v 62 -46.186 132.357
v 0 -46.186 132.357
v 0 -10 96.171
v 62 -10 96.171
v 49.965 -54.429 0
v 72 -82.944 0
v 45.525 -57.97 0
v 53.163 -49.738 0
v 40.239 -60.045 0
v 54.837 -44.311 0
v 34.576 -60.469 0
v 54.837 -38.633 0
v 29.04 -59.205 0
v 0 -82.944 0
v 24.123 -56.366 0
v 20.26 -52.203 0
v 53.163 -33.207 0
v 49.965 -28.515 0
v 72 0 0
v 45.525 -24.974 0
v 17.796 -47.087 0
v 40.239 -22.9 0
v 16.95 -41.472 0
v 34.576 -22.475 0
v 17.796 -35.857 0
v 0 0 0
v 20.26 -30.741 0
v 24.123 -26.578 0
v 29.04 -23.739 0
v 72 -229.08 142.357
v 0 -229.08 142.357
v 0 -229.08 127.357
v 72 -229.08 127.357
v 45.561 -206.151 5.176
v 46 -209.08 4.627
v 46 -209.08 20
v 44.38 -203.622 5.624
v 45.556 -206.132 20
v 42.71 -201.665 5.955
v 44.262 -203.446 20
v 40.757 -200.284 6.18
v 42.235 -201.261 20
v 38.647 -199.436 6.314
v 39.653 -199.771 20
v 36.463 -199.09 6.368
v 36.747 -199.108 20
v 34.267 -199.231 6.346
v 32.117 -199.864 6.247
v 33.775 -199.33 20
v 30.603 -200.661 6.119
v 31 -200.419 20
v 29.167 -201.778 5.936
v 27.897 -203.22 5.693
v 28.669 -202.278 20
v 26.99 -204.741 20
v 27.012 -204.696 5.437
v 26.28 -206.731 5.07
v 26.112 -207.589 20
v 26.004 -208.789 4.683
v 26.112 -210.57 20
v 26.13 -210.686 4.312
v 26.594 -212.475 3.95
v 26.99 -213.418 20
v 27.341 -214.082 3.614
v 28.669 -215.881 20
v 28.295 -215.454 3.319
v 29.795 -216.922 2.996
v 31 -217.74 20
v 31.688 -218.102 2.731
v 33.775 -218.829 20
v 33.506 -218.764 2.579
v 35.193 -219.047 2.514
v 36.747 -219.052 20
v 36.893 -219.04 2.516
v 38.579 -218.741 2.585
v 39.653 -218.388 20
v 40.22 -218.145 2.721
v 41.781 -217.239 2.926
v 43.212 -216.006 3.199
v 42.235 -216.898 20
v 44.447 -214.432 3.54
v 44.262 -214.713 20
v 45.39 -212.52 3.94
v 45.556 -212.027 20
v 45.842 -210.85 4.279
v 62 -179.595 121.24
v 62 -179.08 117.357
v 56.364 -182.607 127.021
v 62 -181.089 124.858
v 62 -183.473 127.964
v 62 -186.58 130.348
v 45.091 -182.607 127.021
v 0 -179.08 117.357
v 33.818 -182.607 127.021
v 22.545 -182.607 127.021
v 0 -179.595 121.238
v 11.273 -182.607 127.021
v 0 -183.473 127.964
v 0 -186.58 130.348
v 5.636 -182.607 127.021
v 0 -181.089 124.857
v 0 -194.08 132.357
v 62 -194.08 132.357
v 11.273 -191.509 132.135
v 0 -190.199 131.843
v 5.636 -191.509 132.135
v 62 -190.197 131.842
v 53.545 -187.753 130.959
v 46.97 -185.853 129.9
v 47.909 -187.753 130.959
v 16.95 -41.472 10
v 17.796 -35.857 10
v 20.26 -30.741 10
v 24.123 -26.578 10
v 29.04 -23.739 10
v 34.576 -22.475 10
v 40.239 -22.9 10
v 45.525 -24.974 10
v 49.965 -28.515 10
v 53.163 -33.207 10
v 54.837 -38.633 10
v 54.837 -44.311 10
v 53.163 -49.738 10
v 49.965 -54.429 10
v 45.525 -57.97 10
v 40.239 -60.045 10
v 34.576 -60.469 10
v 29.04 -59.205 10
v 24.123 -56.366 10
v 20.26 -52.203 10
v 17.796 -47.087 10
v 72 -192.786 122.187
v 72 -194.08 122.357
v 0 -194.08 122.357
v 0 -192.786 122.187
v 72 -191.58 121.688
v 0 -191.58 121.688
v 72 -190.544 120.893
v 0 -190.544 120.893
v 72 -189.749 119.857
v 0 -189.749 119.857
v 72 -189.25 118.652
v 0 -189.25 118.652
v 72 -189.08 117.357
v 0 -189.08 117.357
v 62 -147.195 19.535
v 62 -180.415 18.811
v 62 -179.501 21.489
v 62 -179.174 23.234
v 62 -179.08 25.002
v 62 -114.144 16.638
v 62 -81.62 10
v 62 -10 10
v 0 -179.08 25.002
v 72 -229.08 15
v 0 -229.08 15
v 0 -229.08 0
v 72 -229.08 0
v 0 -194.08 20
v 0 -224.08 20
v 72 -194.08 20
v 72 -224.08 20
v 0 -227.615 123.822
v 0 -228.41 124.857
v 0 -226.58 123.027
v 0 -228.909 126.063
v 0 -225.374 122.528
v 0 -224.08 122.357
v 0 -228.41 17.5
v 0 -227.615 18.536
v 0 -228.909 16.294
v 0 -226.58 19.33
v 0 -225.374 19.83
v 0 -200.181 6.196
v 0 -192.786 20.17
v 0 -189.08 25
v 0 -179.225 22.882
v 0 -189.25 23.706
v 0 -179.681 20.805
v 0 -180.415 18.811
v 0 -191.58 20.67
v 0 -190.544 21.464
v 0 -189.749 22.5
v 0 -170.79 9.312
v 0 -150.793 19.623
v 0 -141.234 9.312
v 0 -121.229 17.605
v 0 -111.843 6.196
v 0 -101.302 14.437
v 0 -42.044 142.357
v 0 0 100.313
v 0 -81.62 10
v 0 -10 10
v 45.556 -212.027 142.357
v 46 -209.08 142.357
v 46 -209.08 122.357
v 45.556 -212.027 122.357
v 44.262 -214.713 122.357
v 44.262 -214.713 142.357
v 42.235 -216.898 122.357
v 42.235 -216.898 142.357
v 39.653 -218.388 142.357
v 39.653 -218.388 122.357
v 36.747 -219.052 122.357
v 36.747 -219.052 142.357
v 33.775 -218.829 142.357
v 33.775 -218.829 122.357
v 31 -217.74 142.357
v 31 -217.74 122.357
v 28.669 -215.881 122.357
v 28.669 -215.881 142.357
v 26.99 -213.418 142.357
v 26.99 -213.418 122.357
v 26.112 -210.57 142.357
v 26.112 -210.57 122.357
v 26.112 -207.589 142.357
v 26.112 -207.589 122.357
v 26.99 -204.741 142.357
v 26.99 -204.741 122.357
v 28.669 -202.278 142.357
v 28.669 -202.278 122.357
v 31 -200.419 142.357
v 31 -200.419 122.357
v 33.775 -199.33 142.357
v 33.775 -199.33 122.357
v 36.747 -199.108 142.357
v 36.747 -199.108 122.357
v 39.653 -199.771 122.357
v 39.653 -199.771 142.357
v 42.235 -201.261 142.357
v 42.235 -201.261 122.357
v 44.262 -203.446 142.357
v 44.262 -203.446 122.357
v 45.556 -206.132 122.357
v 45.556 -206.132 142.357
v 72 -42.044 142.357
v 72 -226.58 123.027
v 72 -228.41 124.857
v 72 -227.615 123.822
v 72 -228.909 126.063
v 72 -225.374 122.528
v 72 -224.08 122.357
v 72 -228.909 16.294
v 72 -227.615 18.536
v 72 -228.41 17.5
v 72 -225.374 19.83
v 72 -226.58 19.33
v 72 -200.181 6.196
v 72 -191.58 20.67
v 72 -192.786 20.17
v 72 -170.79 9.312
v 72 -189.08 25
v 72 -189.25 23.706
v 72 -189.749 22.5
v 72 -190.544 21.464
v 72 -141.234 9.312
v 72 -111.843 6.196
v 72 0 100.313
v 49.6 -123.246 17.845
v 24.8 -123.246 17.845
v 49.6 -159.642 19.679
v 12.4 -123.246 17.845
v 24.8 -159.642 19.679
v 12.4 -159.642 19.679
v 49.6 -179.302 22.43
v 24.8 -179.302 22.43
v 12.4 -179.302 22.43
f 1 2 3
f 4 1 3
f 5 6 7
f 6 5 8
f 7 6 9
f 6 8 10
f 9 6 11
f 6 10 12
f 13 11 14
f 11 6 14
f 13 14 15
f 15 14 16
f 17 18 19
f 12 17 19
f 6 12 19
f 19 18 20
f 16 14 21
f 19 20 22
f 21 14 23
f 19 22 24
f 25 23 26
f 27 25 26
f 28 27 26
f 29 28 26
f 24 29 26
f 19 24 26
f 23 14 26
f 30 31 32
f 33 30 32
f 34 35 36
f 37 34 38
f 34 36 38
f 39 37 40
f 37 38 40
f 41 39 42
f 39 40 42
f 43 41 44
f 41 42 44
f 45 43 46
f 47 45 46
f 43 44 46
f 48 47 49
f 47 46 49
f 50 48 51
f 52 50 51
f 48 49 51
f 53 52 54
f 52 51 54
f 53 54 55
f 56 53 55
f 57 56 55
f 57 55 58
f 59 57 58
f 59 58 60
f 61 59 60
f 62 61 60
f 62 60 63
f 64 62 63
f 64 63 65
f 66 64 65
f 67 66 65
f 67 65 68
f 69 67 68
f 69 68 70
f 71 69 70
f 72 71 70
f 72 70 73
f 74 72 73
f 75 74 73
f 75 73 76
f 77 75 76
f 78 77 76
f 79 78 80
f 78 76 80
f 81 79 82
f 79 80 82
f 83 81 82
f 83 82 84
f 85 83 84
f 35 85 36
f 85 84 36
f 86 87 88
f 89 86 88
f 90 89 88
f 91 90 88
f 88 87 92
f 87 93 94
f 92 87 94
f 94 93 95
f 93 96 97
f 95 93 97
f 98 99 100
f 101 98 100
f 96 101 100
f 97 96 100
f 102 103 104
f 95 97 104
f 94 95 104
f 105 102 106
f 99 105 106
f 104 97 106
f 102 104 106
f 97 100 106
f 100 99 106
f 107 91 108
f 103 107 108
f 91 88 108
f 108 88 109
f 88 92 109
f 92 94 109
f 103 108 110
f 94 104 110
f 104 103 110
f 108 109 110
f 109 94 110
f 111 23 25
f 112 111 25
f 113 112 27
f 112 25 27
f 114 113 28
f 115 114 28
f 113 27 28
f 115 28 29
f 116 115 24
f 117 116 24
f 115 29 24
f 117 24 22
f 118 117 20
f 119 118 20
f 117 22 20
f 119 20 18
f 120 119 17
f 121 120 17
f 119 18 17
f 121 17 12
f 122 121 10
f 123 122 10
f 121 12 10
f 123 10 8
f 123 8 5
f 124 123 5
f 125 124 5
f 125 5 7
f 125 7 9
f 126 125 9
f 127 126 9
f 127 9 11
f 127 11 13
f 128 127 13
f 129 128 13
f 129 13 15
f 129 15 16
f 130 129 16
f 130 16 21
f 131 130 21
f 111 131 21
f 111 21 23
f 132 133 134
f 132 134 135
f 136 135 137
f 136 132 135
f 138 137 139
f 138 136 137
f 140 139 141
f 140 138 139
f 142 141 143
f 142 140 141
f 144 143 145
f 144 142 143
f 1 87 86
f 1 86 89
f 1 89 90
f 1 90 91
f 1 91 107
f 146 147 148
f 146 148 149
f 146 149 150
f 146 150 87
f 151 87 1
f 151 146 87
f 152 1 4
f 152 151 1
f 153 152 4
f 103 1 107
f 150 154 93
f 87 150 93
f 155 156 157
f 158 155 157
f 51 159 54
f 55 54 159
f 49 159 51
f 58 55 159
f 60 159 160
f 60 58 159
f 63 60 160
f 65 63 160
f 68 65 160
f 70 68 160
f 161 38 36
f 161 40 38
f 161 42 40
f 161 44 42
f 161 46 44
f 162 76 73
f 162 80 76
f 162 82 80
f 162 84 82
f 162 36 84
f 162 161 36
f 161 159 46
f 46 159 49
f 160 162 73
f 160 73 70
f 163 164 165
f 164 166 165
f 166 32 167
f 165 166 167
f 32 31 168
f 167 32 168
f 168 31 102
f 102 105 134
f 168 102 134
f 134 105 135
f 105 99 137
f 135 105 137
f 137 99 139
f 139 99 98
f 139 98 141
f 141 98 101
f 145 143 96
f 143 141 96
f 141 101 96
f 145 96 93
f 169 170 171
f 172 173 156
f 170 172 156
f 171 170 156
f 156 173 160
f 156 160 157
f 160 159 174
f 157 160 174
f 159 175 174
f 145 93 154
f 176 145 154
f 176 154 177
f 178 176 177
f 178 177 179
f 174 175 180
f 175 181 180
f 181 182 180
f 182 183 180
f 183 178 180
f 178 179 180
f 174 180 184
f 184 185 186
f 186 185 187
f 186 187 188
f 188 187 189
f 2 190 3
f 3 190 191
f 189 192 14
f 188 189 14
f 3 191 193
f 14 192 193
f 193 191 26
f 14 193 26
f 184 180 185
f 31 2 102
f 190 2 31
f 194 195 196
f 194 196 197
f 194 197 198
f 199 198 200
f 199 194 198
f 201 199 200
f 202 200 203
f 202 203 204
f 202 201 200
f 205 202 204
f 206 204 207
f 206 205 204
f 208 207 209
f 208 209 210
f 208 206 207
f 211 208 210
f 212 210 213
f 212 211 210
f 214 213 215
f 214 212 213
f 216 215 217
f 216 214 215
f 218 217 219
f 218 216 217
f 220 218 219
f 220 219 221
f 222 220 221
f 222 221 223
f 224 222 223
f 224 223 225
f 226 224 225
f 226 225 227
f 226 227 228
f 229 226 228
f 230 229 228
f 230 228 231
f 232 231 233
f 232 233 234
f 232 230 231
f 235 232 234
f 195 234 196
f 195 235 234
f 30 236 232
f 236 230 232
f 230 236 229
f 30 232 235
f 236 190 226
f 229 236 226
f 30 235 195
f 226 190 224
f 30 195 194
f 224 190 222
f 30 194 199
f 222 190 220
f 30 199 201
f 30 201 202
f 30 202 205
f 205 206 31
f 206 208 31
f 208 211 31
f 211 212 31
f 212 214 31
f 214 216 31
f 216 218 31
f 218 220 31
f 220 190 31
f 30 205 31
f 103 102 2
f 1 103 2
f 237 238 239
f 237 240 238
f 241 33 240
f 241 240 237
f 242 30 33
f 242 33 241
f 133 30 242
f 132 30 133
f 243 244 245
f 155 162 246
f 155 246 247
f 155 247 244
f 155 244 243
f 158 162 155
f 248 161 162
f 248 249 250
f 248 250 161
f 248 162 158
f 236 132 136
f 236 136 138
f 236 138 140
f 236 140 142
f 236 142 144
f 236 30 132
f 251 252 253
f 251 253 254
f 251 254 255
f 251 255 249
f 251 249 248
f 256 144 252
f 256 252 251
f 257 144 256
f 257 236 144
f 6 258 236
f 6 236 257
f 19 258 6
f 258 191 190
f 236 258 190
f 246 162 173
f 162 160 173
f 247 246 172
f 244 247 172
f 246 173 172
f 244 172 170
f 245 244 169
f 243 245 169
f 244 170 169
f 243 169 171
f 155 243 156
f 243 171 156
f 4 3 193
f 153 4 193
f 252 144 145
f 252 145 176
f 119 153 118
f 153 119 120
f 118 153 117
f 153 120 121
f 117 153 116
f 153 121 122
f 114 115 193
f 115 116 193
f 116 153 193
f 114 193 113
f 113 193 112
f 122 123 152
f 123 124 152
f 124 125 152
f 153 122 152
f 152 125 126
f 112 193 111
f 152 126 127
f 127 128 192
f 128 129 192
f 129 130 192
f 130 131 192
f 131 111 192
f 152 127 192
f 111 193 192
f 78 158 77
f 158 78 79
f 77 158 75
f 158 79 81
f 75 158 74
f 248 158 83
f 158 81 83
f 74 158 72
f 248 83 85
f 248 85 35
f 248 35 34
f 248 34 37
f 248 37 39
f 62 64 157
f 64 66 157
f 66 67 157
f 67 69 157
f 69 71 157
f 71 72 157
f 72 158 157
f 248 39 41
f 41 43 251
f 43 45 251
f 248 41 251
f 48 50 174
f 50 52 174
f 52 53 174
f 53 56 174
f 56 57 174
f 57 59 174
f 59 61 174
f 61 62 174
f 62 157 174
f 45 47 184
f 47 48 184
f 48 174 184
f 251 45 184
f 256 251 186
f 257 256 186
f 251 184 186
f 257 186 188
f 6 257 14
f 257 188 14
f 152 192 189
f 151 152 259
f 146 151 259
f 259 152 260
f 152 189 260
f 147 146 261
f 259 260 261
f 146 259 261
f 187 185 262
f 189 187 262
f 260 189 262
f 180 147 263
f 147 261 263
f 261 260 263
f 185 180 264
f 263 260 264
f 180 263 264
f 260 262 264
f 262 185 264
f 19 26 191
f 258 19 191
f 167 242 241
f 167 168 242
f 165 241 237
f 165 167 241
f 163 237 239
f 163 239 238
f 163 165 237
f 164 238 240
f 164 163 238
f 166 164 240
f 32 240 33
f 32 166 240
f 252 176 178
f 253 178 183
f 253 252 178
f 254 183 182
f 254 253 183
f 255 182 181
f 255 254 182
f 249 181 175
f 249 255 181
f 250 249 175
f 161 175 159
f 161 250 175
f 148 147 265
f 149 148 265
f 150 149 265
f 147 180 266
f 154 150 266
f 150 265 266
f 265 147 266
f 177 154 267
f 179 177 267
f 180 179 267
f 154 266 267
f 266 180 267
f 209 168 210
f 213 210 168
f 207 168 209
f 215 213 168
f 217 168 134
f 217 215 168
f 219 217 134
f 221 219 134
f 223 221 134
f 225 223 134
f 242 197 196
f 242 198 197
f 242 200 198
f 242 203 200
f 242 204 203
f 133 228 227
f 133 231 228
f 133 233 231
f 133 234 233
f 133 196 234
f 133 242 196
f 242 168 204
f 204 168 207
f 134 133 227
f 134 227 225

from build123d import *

# Parameters (mm, degrees)
BOSS_EXTRUDE1_DEPTH     = 72
SKETCH4_R               = 19.05
CUT_EXTRUDE1_DEPTH      = 15
CUT_EXTRUDE2_DEPTH      = 280.154292263
CUT_EXTRUDE2_DEPTH_BACK = 72
FILLET2_R               = 5
FILLET3_R               = 5
SKETCH7_R               = 10
CUT_EXTRUDE3_DEPTH      = 20
CUT_EXTRUDE4_START      = -20
SKETCH8_R               = 10
CUT_EXTRUDE4_DEPTH      = 20
CUT_EXTRUDE5_DEPTH      = 62
CUT_EXTRUDE5_DEPTH_BACK = 266.891664466


with BuildPart() as part:
    # Sketch3 → Boss-Extrude1 (new body)
    with BuildSketch(Plane(origin=(0, 0, 0), x_dir=(0, 0, -1), z_dir=(1, 0, 0))):
        with BuildLine():
            Line((0, 0), (-100.313440323, 0))
            Line((-100.313440323, 0), (-142.357474116, -42.044033793))
            Line((-142.357474116, -42.044033793), (-142.357474116, -229.079611603))
            Line((-142.357474116, -229.079611603), (0, -229.079611603))
            ThreePointArc((0, -229.079611603), (-9.701802008, -156.011943225), (0, -82.944274847))
            Line((0, -82.944274847), (0, 0))
        make_face()
    extrude(amount=BOSS_EXTRUDE1_DEPTH)

    # Sketch4 → Cut-Extrude1 (cut)
    with BuildSketch(Plane(origin=(0, 0, 0), x_dir=(-1, 0, 0), z_dir=(0, 0, -1))):
        with Locations((-36, -41.472137424)):
            Circle(SKETCH4_R)
    extrude(amount=-CUT_EXTRUDE1_DEPTH, mode=Mode.SUBTRACT)

    # Sketch6 → Cut-Extrude2 (cut, two sides: drawn at the far end of the back side and taken through both)
    with BuildSketch(Plane.ZY.offset(-CUT_EXTRUDE2_DEPTH_BACK)):
        with BuildLine():
            Line((20, -194.079611603), (20, -229.079611603))
            Line((20, -229.079611603), (122.357474116, -229.079611603))
            Line((122.357474116, -229.079611603), (122.357474116, -194.079611603))
            ThreePointArc((122.357474116, -194.079611603), (120.893008022, -190.544077697), (117.357474116, -189.079611603))
            Line((117.357474116, -189.079611603), (25, -189.079611603))
            ThreePointArc((25, -189.079611603), (21.464466094, -190.544077697), (20, -194.079611603))
        make_face()
    extrude(amount=CUT_EXTRUDE2_DEPTH + CUT_EXTRUDE2_DEPTH_BACK, mode=Mode.SUBTRACT)

    # Fillet2
    fillet2_edges = [part.edges().sort_by_distance(p)[0] for p in [
        (36, -229.079611603, 122.357474116),
    ]]
    fillet(fillet2_edges, radius=FILLET2_R)

    # Fillet3
    fillet3_edges = [part.edges().sort_by_distance(p)[0] for p in [
        (36, -229.079611603, 20),
    ]]
    fillet(fillet3_edges, radius=FILLET3_R)

    # Sketch7 → Cut-Extrude3 (cut)
    with BuildSketch(Plane.XY.offset(20)):
        with Locations((36, -209.079611603)):
            Circle(SKETCH7_R)
    extrude(amount=-CUT_EXTRUDE3_DEPTH, mode=Mode.SUBTRACT)

    # Sketch8 → Cut-Extrude4 (cut)
    with BuildSketch(Plane(origin=(0, 0, 122.357474116), x_dir=(-1, 0, 0), z_dir=(0, 0, -1)).offset(CUT_EXTRUDE4_START)):
        with Locations(Location((-36, -209.079611603, 0), (0, 0, 180))):
            Circle(SKETCH8_R)
    extrude(amount=CUT_EXTRUDE4_DEPTH, mode=Mode.SUBTRACT)

    # 3DSketch1 → Cut-Extrude5 (cut, two sides: drawn at the far end of the back side and taken through both)
    with BuildSketch(Plane(origin=(0, -10, 10), x_dir=(0, -0.8328059611361112, 0.5535650197548234), z_dir=(1, 0, 0)).offset(-CUT_EXTRUDE5_DEPTH_BACK)):
        with BuildLine():
            Line((0, 0), (59.645268452, 39.646130972))
            add(Edge.make_bspline(
                [(59.645268452, 39.646130972), (59.851795376, 39.715600731), (60.058269091, 39.785227228), (60.264675078, 39.855053234), (63.229785209, 40.86201534), (66.17490971, 41.927849195), (68.900213672, 42.962126659), (76.587988483, 45.990190363), (84.19497116, 49.226232383), (89.073273504, 51.419920765), (100.476332318, 56.870903082), (111.513798328, 63.017783233), (117.769927201, 66.769037831), (127.427935538, 72.935642789), (136.853699774, 79.471867671), (140.230773606, 81.904573636), (143.55059138, 84.409472242), (146.799821395, 86.998315475)],
                knots=[0, 0, 0, 0, 0, 0, 0.010941255, 0.010941255, 0.010941255, 0.157238463, 0.157238463, 0.157238463, 0.425526751, 0.425526751, 0.425526751, 0.791499989, 0.791499989, 0.791499989, 1, 1, 1, 1, 1, 1], degree=5))
            add(Edge.make_bspline(
                [(146.799821395, 86.998315475), (146.838080386, 86.762713184), (146.881107812, 86.527938496), (146.928924899, 86.294146385), (147.096403086, 85.553769019), (147.312816425, 84.826481066), (147.482240174, 84.333957214), (147.795805007, 83.524872282), (148.156499747, 82.733389058), (148.30986597, 82.422264084), (148.555972143, 81.967326058), (148.831974102, 81.531039473), (148.925540772, 81.387965286), (149.020186904, 81.245580943), (149.114830616, 81.103195054), (149.115042333, 81.102876537)],
                knots=[0, 0, 0, 0, 0, 0, 0.186963411, 0.186963411, 0.186963411, 0.594974268, 0.594974268, 0.594974268, 0.865886461, 0.865886461, 0.865886461, 0.999699989, 1, 1, 1, 1, 1, 1], degree=5))
            Line((149.115042333, 81.102876537), (200.239850729, 4.188614121))
            add(Edge.make_bspline(
                [(200.239850729, 4.188614121), (200.33660104, 4.043058978), (200.433351351, 3.897503835), (200.531212292, 3.752716424), (200.831458899, 3.322960579), (201.161692533, 2.913933484), (201.392598415, 2.649392187), (201.990294831, 2.005724158), (202.622961514, 1.399585759), (203.015866658, 1.051305446), (203.829718887, 0.389334387), (204.702518346, -0.195889299), (205.152045635, -0.468884344), (206.074136833, -0.974780932), (207.035864281, -1.398770698), (207.525516965, -1.589737739), (208.520160048, -1.92851386), (209.540998156, -2.178769515), (210.056594039, -2.281493418), (211.095395611, -2.441585761), (212.14392909, -2.509871945), (212.669382635, -2.521145098), (213.720170989, -2.498114724), (214.765737187, -2.384257389), (215.285564899, -2.304395964), (216.311894633, -2.099178413), (217.313403497, -1.80116732), (217.805927348, -1.631743571), (218.615012281, -1.318178739), (219.406495505, -0.957483999), (219.717620478, -0.804117776), (220.172558504, -0.558011603), (220.608521923, -0.282214084), (220.751280697, -0.188863989), (220.89334807, -0.094431995), (221.035415443, 0)],
                knots=[0, 0, 0, 0, 0, 0, 0.037135909, 0.037135909, 0.037135909, 0.111407726, 0.111407726, 0.111407726, 0.222815452, 0.222815452, 0.222815452, 0.334223178, 0.334223178, 0.334223178, 0.445630904, 0.445630904, 0.445630904, 0.55703863, 0.55703863, 0.55703863, 0.668446357, 0.668446357, 0.668446357, 0.779854083, 0.779854083, 0.779854083, 0.890371964, 0.890371964, 0.890371964, 0.963753936, 0.963753936, 0.963753936, 1, 1, 1, 1, 1, 1], degree=5))
            Line((221.035415443, 0), (97.868875178, -81.868636245))
            Line((97.868875178, -81.868636245), (47.701419988, -71.763976232))
            Line((47.701419988, -71.763976232), (0, 0))
        make_face()
    extrude(amount=CUT_EXTRUDE5_DEPTH + CUT_EXTRUDE5_DEPTH_BACK, mode=Mode.SUBTRACT)


solid = part.part
